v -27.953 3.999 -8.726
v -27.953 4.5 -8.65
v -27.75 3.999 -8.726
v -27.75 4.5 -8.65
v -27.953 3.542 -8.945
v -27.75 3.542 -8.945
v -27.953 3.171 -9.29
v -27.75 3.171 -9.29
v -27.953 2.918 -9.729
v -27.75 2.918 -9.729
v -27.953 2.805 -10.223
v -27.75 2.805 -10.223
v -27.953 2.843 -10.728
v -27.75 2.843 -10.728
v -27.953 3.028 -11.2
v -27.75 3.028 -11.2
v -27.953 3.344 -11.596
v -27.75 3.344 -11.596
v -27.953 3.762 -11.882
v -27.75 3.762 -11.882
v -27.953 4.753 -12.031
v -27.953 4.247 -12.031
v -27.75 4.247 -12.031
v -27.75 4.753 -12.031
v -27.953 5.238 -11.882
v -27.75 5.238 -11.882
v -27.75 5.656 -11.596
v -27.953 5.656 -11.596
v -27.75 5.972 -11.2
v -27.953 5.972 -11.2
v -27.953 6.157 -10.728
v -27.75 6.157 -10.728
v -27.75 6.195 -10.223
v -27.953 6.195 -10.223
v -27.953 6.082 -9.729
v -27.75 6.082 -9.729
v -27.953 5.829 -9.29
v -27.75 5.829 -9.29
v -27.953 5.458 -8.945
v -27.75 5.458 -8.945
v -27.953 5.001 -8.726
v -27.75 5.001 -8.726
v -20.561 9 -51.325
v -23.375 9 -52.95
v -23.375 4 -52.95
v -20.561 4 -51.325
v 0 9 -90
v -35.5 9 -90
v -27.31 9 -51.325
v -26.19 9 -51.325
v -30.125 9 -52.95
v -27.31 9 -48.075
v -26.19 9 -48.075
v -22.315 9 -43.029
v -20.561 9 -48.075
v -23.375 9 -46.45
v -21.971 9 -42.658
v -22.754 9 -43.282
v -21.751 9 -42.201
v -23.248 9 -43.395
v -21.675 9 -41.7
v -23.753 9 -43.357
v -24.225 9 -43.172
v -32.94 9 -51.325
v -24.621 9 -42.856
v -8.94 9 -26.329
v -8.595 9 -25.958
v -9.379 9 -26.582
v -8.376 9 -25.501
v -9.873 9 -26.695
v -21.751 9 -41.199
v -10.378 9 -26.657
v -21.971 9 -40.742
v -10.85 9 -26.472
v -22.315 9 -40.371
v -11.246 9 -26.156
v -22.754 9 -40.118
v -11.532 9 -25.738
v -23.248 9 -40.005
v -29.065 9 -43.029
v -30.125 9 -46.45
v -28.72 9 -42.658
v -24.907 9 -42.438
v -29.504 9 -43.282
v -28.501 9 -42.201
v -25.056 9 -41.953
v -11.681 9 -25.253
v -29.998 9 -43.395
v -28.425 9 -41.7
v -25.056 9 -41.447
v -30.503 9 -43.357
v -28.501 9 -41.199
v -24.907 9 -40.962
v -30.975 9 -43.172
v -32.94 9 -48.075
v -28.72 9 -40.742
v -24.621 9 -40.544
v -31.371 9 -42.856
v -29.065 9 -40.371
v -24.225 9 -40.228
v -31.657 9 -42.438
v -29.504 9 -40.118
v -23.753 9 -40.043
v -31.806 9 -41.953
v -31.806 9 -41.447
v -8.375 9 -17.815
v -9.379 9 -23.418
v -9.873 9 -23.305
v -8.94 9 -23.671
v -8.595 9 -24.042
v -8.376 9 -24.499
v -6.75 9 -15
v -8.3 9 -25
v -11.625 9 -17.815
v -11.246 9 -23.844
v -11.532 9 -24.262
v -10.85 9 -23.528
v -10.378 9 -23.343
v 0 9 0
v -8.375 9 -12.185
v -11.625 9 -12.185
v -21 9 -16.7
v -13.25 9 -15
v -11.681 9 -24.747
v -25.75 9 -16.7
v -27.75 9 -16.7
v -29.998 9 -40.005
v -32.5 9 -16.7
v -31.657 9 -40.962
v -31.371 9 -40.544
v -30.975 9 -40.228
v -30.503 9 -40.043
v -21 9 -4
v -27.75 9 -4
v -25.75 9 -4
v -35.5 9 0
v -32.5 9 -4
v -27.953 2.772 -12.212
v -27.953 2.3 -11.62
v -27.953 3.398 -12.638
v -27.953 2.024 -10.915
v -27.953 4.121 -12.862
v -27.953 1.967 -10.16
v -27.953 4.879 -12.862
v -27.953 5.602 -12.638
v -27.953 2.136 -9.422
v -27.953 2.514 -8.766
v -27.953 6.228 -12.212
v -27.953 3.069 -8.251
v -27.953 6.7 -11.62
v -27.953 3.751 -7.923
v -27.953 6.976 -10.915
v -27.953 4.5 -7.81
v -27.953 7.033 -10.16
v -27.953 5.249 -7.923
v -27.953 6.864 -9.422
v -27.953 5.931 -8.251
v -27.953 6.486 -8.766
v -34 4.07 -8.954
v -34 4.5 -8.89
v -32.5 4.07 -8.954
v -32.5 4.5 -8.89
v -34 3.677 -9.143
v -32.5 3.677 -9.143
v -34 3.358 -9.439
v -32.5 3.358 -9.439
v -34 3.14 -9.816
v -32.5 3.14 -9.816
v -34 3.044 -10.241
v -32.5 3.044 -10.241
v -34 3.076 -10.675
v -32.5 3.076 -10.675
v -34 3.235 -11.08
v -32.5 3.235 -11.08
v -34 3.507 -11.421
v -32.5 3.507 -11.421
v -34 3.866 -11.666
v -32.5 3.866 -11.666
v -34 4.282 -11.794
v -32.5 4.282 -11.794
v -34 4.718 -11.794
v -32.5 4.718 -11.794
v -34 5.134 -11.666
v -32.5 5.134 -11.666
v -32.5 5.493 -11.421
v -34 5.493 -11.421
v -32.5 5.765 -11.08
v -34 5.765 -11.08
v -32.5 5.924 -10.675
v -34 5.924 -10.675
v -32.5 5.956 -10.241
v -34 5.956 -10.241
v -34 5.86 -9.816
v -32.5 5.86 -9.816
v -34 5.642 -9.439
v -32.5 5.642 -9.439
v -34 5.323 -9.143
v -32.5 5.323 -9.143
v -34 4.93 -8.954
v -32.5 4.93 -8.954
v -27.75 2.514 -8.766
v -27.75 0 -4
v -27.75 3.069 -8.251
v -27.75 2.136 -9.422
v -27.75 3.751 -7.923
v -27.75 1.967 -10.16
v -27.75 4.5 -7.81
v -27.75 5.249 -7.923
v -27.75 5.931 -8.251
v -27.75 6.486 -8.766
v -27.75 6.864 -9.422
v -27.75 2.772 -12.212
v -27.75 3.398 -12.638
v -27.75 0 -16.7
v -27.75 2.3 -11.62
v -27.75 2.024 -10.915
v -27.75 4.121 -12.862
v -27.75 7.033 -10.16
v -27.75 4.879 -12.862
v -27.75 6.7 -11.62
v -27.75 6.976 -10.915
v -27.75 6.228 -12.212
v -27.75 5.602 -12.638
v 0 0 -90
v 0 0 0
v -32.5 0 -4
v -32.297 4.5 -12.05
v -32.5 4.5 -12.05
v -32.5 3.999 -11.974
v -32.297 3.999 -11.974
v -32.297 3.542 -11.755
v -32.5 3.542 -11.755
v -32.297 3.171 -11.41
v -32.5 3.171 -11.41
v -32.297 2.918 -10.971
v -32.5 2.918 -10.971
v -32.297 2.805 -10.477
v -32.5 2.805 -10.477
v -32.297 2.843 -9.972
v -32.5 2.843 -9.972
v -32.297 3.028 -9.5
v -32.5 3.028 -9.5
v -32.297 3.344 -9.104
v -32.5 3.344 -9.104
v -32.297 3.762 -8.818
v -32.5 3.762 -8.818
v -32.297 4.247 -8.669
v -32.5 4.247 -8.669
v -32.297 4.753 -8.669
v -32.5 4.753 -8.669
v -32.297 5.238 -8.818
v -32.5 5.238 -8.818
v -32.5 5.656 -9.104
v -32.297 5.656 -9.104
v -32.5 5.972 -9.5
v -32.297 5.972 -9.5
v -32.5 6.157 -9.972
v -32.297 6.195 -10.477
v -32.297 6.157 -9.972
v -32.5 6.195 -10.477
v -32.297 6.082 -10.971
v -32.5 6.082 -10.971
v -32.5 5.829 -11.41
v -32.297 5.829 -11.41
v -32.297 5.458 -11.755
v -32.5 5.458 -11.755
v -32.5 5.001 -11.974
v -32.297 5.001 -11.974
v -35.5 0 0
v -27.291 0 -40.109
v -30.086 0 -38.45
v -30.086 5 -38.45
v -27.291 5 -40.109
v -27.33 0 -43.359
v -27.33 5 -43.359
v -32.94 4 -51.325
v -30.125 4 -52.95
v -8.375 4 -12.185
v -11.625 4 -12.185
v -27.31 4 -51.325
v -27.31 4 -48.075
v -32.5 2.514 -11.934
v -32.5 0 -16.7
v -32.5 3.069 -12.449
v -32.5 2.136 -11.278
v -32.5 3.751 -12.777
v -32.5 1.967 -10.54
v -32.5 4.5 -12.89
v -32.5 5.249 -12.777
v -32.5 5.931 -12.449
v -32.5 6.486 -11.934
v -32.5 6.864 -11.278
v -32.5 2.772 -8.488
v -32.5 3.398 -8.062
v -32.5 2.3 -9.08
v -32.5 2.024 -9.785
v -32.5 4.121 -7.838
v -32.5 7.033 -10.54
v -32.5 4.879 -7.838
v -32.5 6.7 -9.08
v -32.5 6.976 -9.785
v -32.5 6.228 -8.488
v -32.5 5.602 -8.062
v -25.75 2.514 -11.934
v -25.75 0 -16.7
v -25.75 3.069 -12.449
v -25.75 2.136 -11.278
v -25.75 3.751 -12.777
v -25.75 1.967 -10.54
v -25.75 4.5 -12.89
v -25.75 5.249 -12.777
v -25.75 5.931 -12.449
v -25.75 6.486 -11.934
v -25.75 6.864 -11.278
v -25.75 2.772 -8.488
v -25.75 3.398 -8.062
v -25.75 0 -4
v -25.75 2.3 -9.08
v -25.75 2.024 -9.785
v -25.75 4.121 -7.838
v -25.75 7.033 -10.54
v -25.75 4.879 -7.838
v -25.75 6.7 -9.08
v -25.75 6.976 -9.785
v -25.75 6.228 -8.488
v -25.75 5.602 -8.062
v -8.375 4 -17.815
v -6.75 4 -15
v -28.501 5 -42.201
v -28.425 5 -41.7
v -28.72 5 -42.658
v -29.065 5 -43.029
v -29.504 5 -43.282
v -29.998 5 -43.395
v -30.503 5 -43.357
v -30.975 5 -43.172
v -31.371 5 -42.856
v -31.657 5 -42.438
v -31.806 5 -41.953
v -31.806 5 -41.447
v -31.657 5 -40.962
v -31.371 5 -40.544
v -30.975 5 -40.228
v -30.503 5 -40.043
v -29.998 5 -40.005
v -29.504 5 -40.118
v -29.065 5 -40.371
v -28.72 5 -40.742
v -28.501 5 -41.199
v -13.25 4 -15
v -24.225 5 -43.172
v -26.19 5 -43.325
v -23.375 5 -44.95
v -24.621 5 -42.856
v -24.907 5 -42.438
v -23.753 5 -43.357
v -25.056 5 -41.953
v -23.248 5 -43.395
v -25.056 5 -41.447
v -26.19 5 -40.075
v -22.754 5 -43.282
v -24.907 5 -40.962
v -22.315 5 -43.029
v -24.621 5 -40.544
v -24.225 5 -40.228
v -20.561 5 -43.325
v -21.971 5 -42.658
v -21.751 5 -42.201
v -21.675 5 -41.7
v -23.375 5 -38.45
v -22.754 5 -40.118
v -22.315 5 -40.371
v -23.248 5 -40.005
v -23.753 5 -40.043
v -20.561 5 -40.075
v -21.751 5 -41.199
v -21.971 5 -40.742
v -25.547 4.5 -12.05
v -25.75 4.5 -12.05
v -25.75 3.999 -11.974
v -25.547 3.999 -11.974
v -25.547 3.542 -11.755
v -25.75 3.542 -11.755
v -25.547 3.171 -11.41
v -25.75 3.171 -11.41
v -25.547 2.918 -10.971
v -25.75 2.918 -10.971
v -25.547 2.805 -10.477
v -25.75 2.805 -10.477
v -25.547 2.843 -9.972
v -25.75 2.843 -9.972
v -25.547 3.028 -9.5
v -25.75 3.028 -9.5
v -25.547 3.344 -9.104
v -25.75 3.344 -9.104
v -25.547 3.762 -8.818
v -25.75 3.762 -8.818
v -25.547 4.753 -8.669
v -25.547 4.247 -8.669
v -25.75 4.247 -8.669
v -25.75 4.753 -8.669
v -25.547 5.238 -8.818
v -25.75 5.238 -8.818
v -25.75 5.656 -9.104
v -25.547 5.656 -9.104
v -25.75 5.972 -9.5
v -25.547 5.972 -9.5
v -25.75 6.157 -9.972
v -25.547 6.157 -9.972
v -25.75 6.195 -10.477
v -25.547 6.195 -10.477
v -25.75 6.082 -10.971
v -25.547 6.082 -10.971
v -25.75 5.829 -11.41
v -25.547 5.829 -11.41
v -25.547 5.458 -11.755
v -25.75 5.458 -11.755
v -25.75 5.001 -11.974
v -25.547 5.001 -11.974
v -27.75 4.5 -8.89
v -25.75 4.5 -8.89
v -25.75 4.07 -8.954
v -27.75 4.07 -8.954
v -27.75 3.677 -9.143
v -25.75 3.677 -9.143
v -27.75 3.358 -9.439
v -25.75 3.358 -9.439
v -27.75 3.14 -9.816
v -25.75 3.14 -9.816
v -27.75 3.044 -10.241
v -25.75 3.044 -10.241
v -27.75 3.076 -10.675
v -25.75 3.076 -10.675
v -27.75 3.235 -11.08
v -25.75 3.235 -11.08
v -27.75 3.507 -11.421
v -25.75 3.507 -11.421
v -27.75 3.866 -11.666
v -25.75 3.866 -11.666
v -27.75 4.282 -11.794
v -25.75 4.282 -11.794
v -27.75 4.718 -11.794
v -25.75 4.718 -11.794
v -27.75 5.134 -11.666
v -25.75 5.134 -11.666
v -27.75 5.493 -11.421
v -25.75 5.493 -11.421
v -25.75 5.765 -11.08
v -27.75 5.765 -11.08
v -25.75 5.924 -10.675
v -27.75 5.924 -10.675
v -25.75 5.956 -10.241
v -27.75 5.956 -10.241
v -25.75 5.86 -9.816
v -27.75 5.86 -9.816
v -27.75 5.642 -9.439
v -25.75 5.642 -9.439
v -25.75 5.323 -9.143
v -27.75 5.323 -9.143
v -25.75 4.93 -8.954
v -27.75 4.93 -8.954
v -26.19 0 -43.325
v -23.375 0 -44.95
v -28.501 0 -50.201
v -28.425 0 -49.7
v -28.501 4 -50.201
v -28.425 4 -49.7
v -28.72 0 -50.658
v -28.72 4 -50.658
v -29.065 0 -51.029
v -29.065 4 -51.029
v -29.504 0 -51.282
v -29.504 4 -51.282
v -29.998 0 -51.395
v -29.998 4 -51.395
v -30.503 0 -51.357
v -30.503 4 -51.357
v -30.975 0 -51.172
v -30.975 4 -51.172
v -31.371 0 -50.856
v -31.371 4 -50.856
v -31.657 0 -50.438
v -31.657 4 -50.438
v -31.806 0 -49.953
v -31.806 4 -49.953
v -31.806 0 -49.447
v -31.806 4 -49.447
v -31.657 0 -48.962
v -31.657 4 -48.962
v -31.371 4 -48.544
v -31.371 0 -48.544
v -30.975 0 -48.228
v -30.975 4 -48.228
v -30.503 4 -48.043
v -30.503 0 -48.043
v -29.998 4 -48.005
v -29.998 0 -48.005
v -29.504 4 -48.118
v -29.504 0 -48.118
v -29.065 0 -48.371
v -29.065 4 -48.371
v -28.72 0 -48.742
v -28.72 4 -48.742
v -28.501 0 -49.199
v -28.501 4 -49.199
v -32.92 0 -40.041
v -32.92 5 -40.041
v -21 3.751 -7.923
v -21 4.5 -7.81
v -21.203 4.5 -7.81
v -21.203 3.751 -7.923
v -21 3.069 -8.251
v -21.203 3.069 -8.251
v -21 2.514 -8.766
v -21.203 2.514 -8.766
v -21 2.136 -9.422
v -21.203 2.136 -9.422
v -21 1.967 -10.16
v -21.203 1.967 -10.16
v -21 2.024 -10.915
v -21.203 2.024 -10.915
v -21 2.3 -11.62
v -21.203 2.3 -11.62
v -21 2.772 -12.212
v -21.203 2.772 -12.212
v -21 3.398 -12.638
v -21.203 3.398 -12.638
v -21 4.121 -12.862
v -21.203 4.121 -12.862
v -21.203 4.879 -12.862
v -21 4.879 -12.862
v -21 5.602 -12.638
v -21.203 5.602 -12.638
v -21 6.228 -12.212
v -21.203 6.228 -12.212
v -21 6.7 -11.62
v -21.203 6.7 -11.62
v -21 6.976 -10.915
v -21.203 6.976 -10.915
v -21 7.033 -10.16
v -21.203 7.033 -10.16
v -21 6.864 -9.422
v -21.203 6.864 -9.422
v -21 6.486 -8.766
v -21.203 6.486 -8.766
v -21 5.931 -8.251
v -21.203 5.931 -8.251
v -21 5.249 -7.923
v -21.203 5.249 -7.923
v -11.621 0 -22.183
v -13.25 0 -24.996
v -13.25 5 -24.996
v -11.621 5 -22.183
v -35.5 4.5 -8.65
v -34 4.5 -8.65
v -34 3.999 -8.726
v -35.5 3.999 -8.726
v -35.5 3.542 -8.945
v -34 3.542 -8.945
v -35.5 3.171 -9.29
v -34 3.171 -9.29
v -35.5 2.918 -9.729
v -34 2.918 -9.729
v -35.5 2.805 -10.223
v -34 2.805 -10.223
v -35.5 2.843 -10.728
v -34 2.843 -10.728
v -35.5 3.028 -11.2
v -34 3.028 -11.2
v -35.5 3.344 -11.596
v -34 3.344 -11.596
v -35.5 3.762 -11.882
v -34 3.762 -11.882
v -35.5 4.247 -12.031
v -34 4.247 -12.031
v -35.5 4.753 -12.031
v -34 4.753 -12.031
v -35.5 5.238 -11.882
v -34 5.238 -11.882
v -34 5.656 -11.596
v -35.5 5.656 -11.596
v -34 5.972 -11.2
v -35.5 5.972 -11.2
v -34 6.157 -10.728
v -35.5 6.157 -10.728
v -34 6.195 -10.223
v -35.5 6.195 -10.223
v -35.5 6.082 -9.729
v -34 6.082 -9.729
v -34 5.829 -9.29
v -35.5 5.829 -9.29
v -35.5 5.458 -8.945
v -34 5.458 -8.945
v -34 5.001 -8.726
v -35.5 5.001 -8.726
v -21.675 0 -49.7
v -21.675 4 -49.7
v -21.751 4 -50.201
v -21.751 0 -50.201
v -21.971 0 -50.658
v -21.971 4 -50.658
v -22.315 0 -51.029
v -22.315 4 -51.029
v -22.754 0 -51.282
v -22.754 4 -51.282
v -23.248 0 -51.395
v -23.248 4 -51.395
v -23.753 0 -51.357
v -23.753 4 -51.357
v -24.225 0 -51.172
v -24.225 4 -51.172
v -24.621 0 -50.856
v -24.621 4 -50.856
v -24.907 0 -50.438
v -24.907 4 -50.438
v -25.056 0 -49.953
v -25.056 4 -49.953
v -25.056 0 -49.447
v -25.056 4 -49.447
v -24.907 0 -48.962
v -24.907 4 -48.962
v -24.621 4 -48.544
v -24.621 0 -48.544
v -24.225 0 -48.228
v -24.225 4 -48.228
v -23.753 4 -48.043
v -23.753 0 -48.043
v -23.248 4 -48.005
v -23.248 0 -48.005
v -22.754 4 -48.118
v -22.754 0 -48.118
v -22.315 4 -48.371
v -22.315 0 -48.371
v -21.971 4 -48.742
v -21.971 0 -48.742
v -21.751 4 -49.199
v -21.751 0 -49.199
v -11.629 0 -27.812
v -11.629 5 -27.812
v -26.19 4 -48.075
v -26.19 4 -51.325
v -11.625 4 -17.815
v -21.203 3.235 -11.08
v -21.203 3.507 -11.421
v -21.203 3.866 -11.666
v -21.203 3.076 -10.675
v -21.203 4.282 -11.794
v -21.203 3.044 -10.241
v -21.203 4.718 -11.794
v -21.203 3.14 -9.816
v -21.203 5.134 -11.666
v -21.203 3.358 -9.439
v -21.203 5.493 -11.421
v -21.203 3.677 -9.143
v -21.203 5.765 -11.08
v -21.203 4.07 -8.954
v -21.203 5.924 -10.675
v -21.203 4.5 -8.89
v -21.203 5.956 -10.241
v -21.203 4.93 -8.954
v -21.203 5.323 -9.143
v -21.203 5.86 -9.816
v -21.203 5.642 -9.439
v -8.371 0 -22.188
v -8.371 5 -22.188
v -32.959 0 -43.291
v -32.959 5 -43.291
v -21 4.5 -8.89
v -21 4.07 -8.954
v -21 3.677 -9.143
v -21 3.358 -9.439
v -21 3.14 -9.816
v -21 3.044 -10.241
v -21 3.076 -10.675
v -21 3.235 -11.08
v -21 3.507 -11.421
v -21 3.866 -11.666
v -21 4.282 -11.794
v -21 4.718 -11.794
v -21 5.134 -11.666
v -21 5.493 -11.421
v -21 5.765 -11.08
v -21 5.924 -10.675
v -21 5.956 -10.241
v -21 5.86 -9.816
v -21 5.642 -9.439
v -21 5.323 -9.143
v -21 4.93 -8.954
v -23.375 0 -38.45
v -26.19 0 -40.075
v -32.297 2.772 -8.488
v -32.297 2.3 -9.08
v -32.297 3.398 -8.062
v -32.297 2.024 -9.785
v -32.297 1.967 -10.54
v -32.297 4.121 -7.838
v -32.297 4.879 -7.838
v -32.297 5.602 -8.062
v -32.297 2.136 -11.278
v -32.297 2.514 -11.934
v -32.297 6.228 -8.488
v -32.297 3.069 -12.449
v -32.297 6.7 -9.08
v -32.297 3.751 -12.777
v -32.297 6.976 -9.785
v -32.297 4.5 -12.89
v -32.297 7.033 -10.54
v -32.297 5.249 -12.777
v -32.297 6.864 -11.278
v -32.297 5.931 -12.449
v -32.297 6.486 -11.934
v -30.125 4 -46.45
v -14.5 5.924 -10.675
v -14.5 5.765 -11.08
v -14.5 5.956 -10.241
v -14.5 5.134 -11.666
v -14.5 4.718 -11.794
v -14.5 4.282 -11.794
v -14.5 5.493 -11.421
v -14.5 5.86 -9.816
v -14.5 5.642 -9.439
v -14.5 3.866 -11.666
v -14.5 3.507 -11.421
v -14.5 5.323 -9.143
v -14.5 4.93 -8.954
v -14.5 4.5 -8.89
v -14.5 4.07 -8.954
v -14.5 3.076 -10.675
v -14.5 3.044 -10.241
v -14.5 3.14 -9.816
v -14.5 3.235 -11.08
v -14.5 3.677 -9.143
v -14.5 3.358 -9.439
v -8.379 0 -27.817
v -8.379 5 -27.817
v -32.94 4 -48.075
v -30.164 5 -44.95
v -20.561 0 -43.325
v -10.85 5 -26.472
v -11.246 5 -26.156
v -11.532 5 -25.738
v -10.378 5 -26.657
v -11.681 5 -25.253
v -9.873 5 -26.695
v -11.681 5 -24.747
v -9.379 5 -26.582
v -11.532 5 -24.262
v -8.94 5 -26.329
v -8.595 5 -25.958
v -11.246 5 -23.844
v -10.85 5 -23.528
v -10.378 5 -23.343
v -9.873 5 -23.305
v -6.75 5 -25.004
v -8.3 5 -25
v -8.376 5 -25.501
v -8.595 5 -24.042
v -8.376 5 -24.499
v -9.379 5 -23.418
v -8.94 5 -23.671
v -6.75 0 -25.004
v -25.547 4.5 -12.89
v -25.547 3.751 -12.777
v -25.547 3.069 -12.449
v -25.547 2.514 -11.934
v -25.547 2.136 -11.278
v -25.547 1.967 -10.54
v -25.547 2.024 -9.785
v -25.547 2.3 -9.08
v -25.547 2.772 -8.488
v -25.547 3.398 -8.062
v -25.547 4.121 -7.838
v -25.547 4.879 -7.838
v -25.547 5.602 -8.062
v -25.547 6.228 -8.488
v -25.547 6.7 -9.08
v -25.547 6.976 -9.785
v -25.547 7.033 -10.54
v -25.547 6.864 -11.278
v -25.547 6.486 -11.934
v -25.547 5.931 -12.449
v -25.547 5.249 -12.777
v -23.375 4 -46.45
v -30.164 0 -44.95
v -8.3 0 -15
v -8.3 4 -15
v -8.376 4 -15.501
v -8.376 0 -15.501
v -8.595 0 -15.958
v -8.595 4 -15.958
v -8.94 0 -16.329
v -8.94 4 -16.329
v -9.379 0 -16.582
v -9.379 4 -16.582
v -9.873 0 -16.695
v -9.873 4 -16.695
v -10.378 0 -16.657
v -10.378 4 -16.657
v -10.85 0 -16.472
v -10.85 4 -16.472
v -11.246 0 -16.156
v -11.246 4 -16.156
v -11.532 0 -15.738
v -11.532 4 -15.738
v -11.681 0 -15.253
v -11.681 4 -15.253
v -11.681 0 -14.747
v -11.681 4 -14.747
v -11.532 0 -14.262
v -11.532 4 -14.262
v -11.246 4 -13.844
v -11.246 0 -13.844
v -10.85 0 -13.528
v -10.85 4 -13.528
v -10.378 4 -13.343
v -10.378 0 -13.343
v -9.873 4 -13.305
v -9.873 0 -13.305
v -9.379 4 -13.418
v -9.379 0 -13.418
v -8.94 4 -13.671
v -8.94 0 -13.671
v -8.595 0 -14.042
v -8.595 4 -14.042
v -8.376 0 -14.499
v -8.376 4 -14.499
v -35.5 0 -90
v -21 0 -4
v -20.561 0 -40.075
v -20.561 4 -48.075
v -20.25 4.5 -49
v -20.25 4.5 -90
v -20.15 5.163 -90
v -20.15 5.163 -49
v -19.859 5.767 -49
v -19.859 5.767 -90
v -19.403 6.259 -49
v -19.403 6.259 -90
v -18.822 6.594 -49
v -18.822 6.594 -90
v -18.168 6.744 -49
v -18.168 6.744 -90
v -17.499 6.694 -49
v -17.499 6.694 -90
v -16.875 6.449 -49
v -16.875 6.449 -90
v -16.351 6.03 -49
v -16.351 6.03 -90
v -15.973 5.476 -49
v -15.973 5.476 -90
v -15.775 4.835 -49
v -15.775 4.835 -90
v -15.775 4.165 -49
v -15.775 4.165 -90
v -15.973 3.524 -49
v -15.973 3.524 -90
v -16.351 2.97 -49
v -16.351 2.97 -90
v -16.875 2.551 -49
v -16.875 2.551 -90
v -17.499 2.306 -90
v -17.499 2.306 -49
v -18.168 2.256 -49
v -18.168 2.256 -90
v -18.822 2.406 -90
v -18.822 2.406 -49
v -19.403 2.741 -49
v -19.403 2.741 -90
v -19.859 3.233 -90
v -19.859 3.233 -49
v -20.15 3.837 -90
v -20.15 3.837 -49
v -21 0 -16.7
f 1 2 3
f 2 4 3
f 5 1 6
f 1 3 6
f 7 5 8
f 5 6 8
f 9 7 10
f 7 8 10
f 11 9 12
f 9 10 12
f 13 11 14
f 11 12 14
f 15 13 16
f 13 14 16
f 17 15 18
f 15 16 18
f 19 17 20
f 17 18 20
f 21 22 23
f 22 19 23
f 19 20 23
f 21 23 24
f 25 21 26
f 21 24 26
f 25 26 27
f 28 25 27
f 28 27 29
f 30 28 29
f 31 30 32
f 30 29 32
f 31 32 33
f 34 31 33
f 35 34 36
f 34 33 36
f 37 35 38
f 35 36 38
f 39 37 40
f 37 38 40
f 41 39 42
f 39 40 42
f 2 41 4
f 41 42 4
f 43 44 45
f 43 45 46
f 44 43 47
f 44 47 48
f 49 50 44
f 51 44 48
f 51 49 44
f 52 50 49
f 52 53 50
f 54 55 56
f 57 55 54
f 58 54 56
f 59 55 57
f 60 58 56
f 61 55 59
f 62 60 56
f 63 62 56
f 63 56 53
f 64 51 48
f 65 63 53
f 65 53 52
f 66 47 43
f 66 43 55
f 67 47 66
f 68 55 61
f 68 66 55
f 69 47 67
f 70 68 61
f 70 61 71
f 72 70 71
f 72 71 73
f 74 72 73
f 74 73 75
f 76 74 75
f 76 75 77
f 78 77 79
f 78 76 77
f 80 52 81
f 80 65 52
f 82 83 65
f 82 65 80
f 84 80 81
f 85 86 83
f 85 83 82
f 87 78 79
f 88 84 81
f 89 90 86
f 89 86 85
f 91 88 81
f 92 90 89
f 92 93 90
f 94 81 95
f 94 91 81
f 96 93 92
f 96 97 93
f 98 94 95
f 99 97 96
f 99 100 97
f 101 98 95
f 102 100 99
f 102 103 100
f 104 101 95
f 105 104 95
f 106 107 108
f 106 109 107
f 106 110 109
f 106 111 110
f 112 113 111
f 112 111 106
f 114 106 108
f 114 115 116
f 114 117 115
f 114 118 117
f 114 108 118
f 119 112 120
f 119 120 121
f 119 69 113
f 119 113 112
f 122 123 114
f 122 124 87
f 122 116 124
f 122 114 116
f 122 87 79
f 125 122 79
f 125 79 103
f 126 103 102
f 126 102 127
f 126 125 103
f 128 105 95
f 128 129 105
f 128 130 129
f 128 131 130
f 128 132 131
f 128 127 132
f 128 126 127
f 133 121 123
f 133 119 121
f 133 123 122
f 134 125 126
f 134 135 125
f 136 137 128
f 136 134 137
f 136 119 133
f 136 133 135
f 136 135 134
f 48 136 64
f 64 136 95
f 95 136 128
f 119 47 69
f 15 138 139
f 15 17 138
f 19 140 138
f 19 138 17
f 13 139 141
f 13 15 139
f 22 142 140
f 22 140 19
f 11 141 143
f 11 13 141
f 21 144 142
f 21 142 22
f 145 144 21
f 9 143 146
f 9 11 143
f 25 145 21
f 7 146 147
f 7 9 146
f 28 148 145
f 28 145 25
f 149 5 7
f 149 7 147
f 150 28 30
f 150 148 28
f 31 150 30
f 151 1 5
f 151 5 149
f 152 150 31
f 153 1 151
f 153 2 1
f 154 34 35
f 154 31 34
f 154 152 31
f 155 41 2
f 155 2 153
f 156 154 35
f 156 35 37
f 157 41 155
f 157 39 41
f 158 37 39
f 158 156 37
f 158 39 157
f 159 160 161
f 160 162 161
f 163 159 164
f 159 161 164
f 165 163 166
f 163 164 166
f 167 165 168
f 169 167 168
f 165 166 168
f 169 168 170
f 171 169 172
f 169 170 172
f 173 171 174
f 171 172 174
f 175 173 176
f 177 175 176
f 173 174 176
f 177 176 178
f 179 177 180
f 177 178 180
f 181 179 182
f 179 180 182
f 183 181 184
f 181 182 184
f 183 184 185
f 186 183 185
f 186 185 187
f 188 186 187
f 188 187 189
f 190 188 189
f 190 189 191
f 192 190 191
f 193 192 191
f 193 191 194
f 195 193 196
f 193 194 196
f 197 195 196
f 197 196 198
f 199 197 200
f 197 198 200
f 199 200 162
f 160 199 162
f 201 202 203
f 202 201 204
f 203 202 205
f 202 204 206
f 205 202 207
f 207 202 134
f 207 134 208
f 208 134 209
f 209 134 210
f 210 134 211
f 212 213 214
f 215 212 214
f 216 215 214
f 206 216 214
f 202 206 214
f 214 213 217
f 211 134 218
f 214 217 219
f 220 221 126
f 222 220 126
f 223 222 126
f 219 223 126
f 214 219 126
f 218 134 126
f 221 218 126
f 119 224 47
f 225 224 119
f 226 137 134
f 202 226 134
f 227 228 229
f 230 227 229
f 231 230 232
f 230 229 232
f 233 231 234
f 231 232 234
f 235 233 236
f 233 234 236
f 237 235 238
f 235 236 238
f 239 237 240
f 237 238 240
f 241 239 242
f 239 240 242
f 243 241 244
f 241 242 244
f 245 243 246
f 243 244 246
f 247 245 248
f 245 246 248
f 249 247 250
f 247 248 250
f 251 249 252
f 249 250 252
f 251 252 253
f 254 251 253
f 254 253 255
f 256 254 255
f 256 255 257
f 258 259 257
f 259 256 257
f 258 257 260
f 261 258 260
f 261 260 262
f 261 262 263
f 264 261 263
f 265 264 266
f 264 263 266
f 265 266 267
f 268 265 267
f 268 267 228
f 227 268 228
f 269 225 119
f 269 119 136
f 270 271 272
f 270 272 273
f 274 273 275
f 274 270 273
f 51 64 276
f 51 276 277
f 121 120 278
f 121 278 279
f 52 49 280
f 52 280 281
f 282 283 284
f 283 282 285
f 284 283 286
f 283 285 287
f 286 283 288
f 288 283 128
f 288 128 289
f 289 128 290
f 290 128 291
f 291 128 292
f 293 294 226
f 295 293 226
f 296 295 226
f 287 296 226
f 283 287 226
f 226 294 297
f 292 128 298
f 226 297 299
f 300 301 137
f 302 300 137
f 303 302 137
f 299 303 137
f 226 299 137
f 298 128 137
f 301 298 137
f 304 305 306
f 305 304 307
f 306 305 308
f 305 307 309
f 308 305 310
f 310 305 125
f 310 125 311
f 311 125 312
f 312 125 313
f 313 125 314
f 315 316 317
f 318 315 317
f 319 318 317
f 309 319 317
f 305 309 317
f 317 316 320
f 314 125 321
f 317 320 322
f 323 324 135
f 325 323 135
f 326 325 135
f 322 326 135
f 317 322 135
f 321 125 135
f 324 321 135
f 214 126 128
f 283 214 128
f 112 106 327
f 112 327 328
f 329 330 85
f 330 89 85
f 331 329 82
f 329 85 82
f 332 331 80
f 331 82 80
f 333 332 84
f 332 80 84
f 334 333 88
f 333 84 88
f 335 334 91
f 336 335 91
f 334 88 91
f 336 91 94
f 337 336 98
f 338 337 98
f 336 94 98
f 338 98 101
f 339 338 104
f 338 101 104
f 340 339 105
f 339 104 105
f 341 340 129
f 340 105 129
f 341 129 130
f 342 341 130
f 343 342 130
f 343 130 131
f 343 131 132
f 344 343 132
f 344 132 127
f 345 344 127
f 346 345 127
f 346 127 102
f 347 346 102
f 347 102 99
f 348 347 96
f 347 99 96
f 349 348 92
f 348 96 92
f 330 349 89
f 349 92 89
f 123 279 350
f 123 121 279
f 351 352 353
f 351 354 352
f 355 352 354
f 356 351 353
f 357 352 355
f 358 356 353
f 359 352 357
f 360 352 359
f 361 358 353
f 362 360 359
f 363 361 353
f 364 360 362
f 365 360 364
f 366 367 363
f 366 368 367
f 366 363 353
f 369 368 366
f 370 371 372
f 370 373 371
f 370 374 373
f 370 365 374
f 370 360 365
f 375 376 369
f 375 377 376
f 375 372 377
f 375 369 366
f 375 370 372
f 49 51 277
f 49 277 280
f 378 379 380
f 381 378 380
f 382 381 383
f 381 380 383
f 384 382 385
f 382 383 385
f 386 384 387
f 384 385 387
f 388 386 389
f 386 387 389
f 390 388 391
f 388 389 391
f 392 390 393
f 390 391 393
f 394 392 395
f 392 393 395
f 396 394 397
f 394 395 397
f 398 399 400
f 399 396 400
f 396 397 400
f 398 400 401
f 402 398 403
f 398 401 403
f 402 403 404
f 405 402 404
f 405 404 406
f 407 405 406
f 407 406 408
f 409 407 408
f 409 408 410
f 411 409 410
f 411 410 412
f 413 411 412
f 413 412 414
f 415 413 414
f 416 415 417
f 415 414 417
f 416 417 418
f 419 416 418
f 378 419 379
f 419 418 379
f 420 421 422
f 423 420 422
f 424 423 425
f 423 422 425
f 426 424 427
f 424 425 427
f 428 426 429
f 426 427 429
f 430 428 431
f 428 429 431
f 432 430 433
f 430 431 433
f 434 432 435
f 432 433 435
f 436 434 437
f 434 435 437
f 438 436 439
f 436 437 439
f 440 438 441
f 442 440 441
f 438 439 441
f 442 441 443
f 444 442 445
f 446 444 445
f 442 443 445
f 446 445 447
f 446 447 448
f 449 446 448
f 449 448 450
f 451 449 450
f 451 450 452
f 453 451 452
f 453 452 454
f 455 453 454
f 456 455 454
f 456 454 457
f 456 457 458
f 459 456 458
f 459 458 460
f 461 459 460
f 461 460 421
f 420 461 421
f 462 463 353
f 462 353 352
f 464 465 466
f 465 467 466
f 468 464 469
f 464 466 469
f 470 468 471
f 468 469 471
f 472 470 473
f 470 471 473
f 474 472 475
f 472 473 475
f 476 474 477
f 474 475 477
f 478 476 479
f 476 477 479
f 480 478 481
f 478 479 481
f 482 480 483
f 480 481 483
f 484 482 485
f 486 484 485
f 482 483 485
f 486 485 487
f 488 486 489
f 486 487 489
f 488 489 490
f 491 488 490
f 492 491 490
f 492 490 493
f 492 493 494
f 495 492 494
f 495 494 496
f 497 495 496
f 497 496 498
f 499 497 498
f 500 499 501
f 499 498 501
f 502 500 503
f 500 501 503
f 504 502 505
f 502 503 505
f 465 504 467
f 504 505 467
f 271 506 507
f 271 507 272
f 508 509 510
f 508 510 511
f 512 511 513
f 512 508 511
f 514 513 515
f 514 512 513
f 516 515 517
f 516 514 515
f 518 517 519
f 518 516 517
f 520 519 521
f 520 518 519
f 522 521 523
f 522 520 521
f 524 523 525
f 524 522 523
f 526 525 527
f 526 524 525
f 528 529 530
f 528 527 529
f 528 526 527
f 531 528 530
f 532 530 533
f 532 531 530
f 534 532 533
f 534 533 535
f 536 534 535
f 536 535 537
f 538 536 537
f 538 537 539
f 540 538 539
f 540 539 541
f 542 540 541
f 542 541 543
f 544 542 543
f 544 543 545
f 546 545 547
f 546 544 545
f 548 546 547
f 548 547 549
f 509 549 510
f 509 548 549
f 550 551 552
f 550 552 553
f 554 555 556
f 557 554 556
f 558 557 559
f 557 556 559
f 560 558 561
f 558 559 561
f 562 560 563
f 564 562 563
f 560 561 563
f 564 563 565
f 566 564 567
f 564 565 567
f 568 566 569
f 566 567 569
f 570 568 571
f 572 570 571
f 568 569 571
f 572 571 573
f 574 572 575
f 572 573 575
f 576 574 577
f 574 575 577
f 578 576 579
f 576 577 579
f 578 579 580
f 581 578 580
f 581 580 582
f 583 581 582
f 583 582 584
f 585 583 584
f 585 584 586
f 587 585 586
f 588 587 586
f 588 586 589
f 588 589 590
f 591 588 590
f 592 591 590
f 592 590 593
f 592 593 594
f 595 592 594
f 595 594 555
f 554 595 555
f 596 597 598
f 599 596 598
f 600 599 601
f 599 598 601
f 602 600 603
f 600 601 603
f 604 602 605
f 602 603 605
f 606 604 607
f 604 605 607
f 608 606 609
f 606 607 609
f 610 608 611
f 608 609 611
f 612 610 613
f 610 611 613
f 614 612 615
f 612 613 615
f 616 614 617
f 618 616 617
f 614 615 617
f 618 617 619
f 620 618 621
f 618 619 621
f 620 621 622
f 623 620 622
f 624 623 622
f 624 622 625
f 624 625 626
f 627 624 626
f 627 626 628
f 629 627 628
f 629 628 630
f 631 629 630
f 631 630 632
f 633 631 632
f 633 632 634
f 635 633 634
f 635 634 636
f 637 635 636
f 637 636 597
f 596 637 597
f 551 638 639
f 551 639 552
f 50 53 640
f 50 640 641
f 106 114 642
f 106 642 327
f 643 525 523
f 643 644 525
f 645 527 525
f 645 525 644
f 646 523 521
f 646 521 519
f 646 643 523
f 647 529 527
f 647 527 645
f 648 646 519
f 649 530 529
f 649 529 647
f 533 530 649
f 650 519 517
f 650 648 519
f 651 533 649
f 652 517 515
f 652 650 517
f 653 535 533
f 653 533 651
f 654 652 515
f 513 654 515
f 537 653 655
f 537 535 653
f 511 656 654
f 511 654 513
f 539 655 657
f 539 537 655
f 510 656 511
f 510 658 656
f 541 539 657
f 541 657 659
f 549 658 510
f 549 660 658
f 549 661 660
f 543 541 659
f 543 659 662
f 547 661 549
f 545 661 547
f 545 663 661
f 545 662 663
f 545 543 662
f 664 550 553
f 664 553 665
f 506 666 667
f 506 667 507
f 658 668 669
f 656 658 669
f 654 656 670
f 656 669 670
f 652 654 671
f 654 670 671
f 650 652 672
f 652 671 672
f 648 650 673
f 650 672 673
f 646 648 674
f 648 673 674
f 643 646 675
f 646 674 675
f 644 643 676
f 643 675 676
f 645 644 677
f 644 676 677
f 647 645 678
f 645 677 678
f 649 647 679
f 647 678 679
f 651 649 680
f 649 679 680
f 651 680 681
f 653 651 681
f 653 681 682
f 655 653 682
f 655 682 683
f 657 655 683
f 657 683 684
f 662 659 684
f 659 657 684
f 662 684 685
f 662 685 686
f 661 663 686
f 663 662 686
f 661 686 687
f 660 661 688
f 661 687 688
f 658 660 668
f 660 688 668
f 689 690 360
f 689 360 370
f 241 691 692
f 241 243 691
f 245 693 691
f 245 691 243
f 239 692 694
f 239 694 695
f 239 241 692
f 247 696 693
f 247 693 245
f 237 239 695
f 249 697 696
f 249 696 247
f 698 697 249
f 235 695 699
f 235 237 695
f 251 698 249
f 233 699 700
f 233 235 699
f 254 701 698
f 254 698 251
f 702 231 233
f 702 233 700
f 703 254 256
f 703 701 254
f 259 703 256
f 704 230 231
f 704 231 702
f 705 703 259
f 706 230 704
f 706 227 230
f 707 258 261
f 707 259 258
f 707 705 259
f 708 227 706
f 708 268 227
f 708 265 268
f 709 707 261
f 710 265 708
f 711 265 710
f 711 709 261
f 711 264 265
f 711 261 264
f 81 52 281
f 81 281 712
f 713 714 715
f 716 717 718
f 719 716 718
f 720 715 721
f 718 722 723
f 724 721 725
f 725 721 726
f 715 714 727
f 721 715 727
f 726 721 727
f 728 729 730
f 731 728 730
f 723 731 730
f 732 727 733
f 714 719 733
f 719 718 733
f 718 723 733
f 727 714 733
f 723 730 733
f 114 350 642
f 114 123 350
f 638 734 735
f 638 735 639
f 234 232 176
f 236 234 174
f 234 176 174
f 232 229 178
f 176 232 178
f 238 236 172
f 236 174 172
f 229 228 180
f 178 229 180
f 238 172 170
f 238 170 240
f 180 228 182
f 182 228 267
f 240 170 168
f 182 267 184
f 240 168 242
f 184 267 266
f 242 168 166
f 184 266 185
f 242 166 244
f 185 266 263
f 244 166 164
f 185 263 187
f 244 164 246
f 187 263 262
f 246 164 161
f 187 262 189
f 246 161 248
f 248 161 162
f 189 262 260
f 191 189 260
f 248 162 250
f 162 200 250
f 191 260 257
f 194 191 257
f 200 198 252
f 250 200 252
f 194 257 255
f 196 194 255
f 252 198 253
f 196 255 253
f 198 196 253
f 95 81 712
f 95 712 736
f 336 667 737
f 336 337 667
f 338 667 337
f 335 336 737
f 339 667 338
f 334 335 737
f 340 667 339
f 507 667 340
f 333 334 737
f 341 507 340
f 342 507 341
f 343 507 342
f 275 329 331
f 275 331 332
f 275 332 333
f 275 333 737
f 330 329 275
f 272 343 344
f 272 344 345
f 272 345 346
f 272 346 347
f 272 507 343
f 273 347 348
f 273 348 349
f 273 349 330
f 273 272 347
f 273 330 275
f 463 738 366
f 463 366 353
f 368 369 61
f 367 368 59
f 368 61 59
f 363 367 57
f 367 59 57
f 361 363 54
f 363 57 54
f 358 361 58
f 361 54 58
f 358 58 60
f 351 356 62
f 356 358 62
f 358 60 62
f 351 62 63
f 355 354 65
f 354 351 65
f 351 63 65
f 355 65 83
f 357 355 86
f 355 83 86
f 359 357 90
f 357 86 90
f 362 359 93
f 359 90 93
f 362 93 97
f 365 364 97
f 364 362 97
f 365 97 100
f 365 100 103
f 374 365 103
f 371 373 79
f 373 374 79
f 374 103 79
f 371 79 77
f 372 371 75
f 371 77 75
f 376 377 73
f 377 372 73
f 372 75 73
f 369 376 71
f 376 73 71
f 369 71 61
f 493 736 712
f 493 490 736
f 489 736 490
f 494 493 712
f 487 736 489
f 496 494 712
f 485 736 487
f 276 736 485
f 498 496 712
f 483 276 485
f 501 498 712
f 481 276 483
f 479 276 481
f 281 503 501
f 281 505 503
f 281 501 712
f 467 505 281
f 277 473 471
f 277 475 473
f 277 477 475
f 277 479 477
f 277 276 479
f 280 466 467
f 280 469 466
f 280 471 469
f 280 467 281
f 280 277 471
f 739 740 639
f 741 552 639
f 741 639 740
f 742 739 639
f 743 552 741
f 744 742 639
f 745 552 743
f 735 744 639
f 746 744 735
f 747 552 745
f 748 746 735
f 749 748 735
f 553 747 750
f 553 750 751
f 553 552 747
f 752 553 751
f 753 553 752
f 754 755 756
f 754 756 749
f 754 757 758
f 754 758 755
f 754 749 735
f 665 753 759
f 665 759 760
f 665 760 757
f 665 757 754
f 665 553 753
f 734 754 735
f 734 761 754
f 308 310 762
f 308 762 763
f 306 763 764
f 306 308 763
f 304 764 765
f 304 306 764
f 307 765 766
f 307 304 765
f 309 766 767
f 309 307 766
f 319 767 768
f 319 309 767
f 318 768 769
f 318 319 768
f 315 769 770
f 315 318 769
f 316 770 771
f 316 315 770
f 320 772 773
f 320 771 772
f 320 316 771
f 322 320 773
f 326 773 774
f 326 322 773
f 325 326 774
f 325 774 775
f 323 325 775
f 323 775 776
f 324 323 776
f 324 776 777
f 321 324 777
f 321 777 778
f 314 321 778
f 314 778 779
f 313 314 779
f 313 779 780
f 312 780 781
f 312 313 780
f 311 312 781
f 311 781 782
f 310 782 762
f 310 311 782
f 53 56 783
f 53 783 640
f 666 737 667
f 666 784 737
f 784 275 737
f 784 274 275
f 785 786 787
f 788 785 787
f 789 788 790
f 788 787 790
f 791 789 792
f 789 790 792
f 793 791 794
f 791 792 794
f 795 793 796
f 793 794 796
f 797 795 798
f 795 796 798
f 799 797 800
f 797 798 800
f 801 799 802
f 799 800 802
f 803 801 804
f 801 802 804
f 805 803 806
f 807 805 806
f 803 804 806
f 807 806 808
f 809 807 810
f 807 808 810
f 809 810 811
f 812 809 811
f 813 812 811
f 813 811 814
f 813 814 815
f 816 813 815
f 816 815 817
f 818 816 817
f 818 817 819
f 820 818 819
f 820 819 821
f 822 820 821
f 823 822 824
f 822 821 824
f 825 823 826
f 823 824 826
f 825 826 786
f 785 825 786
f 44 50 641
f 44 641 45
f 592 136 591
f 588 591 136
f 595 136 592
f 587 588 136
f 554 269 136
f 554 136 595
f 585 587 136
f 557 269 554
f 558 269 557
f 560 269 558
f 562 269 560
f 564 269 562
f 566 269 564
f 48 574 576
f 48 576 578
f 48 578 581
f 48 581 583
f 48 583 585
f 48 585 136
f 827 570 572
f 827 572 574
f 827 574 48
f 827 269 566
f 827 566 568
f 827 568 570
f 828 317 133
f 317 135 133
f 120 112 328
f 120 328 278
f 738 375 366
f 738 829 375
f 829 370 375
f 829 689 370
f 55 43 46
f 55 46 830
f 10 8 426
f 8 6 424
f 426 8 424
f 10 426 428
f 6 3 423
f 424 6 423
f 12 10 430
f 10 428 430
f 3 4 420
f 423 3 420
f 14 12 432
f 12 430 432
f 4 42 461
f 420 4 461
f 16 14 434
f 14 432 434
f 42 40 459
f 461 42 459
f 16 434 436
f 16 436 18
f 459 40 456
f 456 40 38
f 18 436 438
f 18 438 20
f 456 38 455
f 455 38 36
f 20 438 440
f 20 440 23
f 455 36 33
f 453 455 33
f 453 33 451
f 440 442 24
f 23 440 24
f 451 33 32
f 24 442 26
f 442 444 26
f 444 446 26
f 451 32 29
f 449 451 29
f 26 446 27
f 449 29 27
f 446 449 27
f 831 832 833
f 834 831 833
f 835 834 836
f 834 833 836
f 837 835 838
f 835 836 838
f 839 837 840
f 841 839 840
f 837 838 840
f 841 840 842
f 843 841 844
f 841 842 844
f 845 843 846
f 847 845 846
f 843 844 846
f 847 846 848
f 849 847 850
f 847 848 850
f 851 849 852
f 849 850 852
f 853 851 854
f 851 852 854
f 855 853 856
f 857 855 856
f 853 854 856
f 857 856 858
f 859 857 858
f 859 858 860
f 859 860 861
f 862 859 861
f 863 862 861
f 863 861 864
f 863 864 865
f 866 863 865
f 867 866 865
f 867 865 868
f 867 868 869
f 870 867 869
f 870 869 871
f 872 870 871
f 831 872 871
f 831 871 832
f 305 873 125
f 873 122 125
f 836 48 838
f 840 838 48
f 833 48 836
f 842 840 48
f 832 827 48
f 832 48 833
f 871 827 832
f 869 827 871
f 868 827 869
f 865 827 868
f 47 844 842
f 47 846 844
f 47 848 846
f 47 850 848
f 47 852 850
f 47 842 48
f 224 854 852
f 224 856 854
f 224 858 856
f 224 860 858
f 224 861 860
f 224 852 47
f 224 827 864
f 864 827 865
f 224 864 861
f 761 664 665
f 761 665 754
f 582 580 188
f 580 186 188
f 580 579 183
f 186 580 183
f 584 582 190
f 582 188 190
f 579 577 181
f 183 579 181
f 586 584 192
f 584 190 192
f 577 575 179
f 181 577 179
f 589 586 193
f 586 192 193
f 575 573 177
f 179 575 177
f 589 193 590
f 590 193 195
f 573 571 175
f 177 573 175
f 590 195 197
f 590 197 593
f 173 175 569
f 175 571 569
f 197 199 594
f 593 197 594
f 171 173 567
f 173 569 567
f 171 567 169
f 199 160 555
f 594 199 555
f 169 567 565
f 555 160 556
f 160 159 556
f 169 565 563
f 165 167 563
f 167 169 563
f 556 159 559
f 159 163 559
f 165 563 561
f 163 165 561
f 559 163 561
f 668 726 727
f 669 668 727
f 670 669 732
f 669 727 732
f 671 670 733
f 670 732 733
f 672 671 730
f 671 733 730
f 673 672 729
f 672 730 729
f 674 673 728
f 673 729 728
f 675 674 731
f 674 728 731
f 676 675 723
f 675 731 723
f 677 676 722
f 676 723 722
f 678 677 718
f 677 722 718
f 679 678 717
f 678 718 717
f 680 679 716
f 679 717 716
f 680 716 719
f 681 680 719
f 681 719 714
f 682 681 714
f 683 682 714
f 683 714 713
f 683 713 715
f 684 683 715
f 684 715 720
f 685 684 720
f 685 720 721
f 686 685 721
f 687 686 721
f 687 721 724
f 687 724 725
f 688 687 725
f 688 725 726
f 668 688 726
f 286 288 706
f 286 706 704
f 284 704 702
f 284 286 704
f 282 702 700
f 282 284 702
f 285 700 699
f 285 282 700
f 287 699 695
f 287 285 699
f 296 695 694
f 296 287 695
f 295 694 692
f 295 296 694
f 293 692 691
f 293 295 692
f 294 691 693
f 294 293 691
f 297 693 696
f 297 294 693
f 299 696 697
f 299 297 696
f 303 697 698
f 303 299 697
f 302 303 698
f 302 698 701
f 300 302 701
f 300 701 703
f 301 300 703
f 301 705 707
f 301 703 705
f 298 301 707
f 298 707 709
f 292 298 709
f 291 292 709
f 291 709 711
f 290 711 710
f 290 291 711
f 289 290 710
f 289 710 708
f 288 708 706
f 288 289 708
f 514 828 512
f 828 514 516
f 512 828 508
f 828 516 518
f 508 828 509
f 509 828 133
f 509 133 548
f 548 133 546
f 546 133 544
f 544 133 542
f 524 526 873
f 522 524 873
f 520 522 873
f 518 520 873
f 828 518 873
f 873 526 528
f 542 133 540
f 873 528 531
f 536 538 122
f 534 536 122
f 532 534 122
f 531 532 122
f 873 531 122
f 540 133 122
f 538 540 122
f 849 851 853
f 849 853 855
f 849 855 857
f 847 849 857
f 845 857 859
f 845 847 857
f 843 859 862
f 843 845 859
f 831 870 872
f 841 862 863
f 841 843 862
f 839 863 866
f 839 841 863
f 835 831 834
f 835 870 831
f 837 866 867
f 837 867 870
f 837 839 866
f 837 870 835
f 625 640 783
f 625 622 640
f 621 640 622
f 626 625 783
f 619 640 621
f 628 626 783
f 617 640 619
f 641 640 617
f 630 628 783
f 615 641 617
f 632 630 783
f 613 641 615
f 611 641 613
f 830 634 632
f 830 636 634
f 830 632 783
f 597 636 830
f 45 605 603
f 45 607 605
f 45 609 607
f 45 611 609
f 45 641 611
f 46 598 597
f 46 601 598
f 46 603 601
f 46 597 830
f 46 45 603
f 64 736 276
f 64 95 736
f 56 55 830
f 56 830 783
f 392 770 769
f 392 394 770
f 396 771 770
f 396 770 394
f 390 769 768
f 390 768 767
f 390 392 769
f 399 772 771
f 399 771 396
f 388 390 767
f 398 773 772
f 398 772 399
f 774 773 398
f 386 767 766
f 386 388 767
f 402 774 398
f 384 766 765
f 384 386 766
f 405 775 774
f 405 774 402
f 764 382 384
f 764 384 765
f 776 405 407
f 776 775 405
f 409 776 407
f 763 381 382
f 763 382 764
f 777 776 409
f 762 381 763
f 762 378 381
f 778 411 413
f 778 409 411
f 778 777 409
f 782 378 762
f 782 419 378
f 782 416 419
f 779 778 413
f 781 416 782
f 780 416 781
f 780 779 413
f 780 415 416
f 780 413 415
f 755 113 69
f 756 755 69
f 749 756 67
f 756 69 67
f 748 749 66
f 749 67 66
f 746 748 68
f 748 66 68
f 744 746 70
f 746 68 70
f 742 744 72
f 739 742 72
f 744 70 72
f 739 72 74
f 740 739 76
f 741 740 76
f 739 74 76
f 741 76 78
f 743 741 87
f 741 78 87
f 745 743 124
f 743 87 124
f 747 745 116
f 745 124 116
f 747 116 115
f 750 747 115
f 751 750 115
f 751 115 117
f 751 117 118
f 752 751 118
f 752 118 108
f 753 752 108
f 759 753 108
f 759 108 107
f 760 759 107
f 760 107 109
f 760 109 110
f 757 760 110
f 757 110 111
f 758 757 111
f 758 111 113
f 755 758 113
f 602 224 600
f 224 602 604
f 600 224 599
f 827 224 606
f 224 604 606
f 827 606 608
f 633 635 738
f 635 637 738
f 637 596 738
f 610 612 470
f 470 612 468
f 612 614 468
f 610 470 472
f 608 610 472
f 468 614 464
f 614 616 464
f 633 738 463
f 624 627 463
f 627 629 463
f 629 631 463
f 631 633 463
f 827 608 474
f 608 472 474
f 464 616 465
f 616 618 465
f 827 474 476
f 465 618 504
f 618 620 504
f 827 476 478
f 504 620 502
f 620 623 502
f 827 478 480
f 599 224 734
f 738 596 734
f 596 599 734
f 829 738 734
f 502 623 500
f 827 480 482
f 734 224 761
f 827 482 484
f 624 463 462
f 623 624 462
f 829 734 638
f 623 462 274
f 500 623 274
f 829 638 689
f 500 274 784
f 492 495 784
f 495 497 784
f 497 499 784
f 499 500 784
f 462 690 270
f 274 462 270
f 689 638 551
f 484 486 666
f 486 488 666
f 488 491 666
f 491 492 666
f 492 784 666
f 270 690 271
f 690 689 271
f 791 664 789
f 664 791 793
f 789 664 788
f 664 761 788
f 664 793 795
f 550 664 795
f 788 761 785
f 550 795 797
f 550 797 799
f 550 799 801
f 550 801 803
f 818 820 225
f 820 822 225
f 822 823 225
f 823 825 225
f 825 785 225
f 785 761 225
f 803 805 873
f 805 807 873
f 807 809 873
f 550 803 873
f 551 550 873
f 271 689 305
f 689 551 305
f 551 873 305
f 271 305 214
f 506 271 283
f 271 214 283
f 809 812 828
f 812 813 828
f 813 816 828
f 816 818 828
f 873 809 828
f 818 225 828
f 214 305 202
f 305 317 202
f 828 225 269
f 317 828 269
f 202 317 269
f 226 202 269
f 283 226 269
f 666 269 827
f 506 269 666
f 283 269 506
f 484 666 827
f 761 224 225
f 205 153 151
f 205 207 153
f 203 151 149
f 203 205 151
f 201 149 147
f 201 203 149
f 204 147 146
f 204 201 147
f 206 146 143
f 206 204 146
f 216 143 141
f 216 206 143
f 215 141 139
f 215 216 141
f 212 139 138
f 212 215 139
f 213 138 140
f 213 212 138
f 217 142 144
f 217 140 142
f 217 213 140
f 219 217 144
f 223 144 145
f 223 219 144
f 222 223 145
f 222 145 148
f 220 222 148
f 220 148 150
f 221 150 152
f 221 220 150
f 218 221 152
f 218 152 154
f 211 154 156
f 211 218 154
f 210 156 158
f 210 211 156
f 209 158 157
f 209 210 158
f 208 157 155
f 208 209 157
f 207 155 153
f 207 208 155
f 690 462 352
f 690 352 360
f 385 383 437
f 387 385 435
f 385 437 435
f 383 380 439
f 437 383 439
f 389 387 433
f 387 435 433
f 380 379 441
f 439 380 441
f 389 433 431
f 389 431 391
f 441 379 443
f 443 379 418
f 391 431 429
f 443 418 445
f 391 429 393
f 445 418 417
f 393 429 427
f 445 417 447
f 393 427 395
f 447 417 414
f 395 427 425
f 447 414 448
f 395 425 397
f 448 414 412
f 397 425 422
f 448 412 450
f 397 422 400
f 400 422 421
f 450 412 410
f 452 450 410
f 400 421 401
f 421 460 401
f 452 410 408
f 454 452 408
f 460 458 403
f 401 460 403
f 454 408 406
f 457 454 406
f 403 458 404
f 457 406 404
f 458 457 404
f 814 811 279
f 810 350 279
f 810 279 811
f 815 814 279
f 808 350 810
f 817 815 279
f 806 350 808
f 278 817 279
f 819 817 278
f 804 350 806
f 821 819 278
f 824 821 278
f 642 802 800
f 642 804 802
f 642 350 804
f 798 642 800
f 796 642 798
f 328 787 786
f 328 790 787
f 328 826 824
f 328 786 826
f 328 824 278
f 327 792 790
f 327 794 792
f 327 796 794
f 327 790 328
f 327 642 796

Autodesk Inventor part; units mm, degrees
sketch "Sketch1" plane through (0, 0, 0) normal (0, 1, 0) x (-1, 0, 0)
  line L0 (0, 0) -> (35.5, 0)
  line L1 (35.5, 0) -> (35.5, -90)
  line L2 (35.5, -90) -> (0, -90)
  line L3 (0, -90) -> (0, 0)
  dimension "d0" = 35.5
  dimension "d1" = 90
extrude "Extrusion1" add sketch "Sketch1" along normal blind 9
sketch "Sketch2" plane through (0, 9, 0) normal (0, 1, 0) x (1, 0, 0)
  circle A0 centre (-10, 15) radius 3.25 construction
  line L0 (-35.5, 0) -> (0, 0) projected
  line L1 (0, 0) -> (0, 90) projected
  line L2 (-13.25, 15) -> (-11.625, 17.8146)
  line L3 (-11.625, 17.8146) -> (-8.375, 17.8146)
  line L4 (-8.375, 17.8146) -> (-6.75, 15)
  line L5 (-6.75, 15) -> (-8.375, 12.1854)
  line L6 (-8.375, 12.1854) -> (-11.625, 12.1854)
  line L7 (-11.625, 12.1854) -> (-13.25, 15)
  line L8 (0, 90) -> (-35.5, 90) projected
  circle A1 centre (-10, 15) radius 1.7 construction
  dimension "d7" = 6.5
  dimension "d24" = 15
  dimension "d25" = 10
  dimension "d28" = 3.4
extrude "Extrusion2" cut sketch "Sketch2" against normal blind 5
sketch "Sketch3" plane through (0, 0, 0) normal (0, -1, 0) x (1, 0, 0)
  circle A0 centre (-10, -25) radius 3.25 construction
  line L0 (0, 0) -> (-35.5, 0) projected
  line L1 (-35.5, 0) -> (-35.5, -90) projected
  line L2 (-11.6286, -27.8125) -> (-13.25, -24.9958)
  line L3 (-13.25, -24.9958) -> (-11.6214, -22.1833)
  line L4 (-11.6214, -22.1833) -> (-8.3714, -22.1875)
  line L5 (-8.3714, -22.1875) -> (-6.75, -25.0042)
  line L6 (-6.75, -25.0042) -> (-8.3786, -27.8167)
  line L7 (-8.3786, -27.8167) -> (-11.6286, -27.8125)
  line L8 (0, -90) -> (0, 0) projected
  dimension "d15" = 6.5
  dimension "d16" = 25
  dimension "d26" = 10
extrude "Extrusion3" cut sketch "Sketch3" against normal blind 5
sketch "Sketch5" plane through (0, 9, 0) normal (0, 1, 0) x (1, 0, 0)
  circle A0 centre (-10, 15) radius 1.7
  line L0 (0, 0) -> (0, 90) projected
  line L1 (-35.5, 0) -> (0, 0) projected
  circle A1 centre (-10, 25) radius 1.7
  dimension "d30" = 3.4
  dimension "d31" = 10
  dimension "d32" = 15
  dimension "d36" = 3.4
  dimension "d37" = 25
extrude "Extrusion4" cut sketch "Sketch5" against normal through all
sketch "Sketch6" plane through (0, 9, 0) normal (0, 1, 0) x (1, 0, 0)
  line L0 (-32.5, 4) -> (-27.7502, 4)
  line L1 (-27.7502, 4) -> (-27.7502, 16.7)
  line L2 (-27.7502, 16.7) -> (-32.5, 16.7)
  line L3 (-32.5, 16.7) -> (-32.5, 4)
  line L4 (-35.5, 0) -> (0, 0) projected
  line L5 (-35.5, 90) -> (-35.5, 0) projected
  line L6 (-25.7502, 4) -> (-21.0002, 4)
  line L7 (-21.0002, 4) -> (-21.0002, 16.7)
  line L8 (-21.0002, 16.7) -> (-25.7502, 16.7)
  line L9 (-25.7502, 16.7) -> (-25.7502, 4)
  line L10 (0, 0) -> (0, 90) construction
  line L11 (-35.5, 90) -> (0, 90) projected
  line L12 (0, 0) -> (-20, 0) construction
  line L13 (-20, 0) -> (-20, 90) construction
  line L14 (-20, 90) -> (0, 90) construction
  line L15 (0, 90) -> (0, 0)
  circle A0 centre (-23.3752, 41.7) radius 1.7
  circle A1 centre (-30.125, 41.7) radius 1.7
  circle A2 centre (-30.125, 49.7) radius 1.7
  circle A3 centre (-23.3752, 49.7) radius 1.7
  dimension "d43" = 4.7498
  dimension "d44" = 12.7
  dimension "d45" = 4
  dimension "d46" = 3
  dimension "d47" = 4.75
  dimension "d48" = 2
  dimension "d49" = 20
  dimension "d50" = 3.4
  dimension "d51" = 25
  dimension "d90" = 3.4
  dimension "d91" = 5.375
  dimension "d92" = 3.4
  dimension "d93" = 8
  dimension "d94" = 3.4
extrude "Extrusion5" cut sketch "Sketch6" against normal through all contours L3 L2 L1 L0 | L9 L8 L7 L6 | A0 | A1 | A2 | A3
sketch "Sketch7" plane through (0, 0, 0) normal (0, -1, 0) x (1, 0, 0)
  circle A0 centre (-23.3752, -41.7) radius 1.7 projected
  circle A1 centre (-23.3752, -41.7) radius 3.25 construction
  line L0 (-23.3752, -38.45) -> (-20.5606, -40.075)
  line L1 (-20.5606, -40.075) -> (-20.5606, -43.325)
  line L2 (-20.5606, -43.325) -> (-23.3752, -44.95)
  line L3 (-23.3752, -44.95) -> (-26.1898, -43.325)
  line L4 (-26.1898, -43.325) -> (-26.1898, -40.075)
  line L5 (-26.1898, -40.075) -> (-23.3752, -38.45)
  line L6 (0, 0) -> (-35.5, 0) projected
  circle A2 centre (-30.125, -41.7) radius 3.25 construction
  line L7 (-35.5, 0) -> (-35.5, -90) projected
  line L8 (-30.1645, -44.9498) -> (-32.9591, -43.2907)
  line L9 (-32.9591, -43.2907) -> (-32.9196, -40.0409)
  line L10 (-32.9196, -40.0409) -> (-30.0855, -38.4502)
  line L11 (-30.0855, -38.4502) -> (-27.2909, -40.1093)
  line L12 (-27.2909, -40.1093) -> (-27.3304, -43.3591)
  line L13 (-27.3304, -43.3591) -> (-30.1645, -44.9498)
  dimension "d88" = 6.5
  dimension "d54" = 6.5
  dimension "d87" = 41.7
  dimension "d89" = 5.375
extrude "Extrusion6" cut sketch "Sketch7" against normal blind 5
sketch "Sketch8" plane through (-35.5, 0, -90) normal (-1, 0, 0) x (0, 0, 1)
  circle A0 centre (79.65, 4.5) radius 1.4605
  line L0 (0, 9) -> (90, 9) projected
  line L1 (90, 0) -> (90, 9) projected
  dimension "d57" = 2.921
  dimension "d58" = 4.5
  dimension "d59" = 10.35
hole "Hole1" at (-35.5, 4.5, -10.35) direction (1, 0, 0) diameter 2.921 depth 21 counterbore diameter 3.4 counterbore depth 1.5
sketch "Sketch9" plane through (-21.0002, 9, -16.7) normal (-1, 0, 0) x (0, 0, 1)
  circle A0 centre (6.35, -4.5) radius 1.4605 projected
  circle A1 centre (6.35, -4.5) radius 2.54
  point P0 (16.7, -9)
  dimension "d67" = 5.08
extrude "Extrusion7" add sketch "Sketch9" along normal blind 0.2032
sketch "Sketch10" plane through (-27.7502, 9, -16.7) normal (-1, 0, 0) x (0, 0, 1)
  circle A0 centre (6.35, -4.5) radius 1.7 projected
  circle A1 centre (6.35, -4.5) radius 2.54
  point P0 (16.7, -9)
  dimension "d70" = 5.08
extrude "Extrusion8" add sketch "Sketch10" along normal blind 0.2032
sketch "Sketch11" plane through (-25.7502, 9, -4) normal (1, 0, 0) x (0, 0, -1)
  circle A0 centre (6.35, -4.5) radius 1.7 projected
  circle A1 centre (6.35, -4.5) radius 2.54
  point P0 (-4, -9)
  dimension "d73" = 5.08
extrude "Extrusion9" add sketch "Sketch11" along normal blind 0.2032
sketch "Sketch12" plane through (-32.5, 9, -4) normal (1, 0, 0) x (0, 0, -1)
  circle A0 centre (6.35, -4.5) radius 1.7 projected
  circle A1 centre (6.35, -4.5) radius 2.54
  point P0 (-4, -9)
  dimension "d76" = 5.08
extrude "Extrusion10" add sketch "Sketch12" along normal blind 0.2032
sketch "Sketch14" plane through (0, 0, -90) normal (0, 0, -1) x (-1, 0, 0)
  circle A0 centre (18, 4.5) radius 2.25
  line L0 (35.5, 0) -> (0, 0) projected
  line L1 (0, 0) -> (0, 9) projected
  dimension "d82" = 4.5
  dimension "d83" = 4.5
  dimension "d84" = 18
extrude "Extrusion11" cut sketch "Sketch14" against normal blind 41
sketch "Sketch15" plane through (0, 9, 0) normal (0, 1, 0) x (1, 0, 0)
  circle A0 centre (-30.125, 49.7) radius 1.7 projected
  circle A1 centre (-30.125, 49.7) radius 3.25 construction
  circle A2 centre (-23.3752, 49.7) radius 1.7 projected
  circle A3 centre (-23.3752, 49.7) radius 3.25 construction
  line L0 (-30.125, 52.95) -> (-27.3104, 51.325)
  line L1 (-27.3104, 51.325) -> (-27.3104, 48.075)
  line L2 (-27.3104, 48.075) -> (-30.125, 46.45)
  line L3 (-30.125, 46.45) -> (-32.9396, 48.075)
  line L4 (-32.9396, 48.075) -> (-32.9396, 51.325)
  line L5 (-32.9396, 51.325) -> (-30.125, 52.95)
  line L6 (-23.3752, 52.95) -> (-20.5606, 51.325)
  line L7 (-20.5606, 51.325) -> (-20.5606, 48.075)
  line L8 (-20.5606, 48.075) -> (-23.3752, 46.45)
  line L9 (-23.3752, 46.45) -> (-26.1898, 48.075)
  line L10 (-26.1898, 48.075) -> (-26.1898, 51.325)
  line L11 (-26.1898, 51.325) -> (-23.3752, 52.95)
  point P0 (0, 0)
  dimension "d95" = 6.5
  dimension "d96" = 6.5
extrude "Extrusion12" cut sketch "Sketch15" against normal blind 5
ref_plane "Work Plane1" through (-30.1251, 9, -4) normal (1, 0, 0) x (0, 0, -1)
ref_plane "Work Plane2" through (-23.3752, 9, -4) normal (1, 0, 0) x (0, 0, -1)
ref_plane "Work Plane3" through (-30.1251, 9, -4) normal (1, 0, 0) x (0, 0, -1)
ref_plane "Work Plane4" through (-23.3752, 9, -4) normal (1, 0, 0) x (0, 0, -1)
properties part number "Bottom coupler"
